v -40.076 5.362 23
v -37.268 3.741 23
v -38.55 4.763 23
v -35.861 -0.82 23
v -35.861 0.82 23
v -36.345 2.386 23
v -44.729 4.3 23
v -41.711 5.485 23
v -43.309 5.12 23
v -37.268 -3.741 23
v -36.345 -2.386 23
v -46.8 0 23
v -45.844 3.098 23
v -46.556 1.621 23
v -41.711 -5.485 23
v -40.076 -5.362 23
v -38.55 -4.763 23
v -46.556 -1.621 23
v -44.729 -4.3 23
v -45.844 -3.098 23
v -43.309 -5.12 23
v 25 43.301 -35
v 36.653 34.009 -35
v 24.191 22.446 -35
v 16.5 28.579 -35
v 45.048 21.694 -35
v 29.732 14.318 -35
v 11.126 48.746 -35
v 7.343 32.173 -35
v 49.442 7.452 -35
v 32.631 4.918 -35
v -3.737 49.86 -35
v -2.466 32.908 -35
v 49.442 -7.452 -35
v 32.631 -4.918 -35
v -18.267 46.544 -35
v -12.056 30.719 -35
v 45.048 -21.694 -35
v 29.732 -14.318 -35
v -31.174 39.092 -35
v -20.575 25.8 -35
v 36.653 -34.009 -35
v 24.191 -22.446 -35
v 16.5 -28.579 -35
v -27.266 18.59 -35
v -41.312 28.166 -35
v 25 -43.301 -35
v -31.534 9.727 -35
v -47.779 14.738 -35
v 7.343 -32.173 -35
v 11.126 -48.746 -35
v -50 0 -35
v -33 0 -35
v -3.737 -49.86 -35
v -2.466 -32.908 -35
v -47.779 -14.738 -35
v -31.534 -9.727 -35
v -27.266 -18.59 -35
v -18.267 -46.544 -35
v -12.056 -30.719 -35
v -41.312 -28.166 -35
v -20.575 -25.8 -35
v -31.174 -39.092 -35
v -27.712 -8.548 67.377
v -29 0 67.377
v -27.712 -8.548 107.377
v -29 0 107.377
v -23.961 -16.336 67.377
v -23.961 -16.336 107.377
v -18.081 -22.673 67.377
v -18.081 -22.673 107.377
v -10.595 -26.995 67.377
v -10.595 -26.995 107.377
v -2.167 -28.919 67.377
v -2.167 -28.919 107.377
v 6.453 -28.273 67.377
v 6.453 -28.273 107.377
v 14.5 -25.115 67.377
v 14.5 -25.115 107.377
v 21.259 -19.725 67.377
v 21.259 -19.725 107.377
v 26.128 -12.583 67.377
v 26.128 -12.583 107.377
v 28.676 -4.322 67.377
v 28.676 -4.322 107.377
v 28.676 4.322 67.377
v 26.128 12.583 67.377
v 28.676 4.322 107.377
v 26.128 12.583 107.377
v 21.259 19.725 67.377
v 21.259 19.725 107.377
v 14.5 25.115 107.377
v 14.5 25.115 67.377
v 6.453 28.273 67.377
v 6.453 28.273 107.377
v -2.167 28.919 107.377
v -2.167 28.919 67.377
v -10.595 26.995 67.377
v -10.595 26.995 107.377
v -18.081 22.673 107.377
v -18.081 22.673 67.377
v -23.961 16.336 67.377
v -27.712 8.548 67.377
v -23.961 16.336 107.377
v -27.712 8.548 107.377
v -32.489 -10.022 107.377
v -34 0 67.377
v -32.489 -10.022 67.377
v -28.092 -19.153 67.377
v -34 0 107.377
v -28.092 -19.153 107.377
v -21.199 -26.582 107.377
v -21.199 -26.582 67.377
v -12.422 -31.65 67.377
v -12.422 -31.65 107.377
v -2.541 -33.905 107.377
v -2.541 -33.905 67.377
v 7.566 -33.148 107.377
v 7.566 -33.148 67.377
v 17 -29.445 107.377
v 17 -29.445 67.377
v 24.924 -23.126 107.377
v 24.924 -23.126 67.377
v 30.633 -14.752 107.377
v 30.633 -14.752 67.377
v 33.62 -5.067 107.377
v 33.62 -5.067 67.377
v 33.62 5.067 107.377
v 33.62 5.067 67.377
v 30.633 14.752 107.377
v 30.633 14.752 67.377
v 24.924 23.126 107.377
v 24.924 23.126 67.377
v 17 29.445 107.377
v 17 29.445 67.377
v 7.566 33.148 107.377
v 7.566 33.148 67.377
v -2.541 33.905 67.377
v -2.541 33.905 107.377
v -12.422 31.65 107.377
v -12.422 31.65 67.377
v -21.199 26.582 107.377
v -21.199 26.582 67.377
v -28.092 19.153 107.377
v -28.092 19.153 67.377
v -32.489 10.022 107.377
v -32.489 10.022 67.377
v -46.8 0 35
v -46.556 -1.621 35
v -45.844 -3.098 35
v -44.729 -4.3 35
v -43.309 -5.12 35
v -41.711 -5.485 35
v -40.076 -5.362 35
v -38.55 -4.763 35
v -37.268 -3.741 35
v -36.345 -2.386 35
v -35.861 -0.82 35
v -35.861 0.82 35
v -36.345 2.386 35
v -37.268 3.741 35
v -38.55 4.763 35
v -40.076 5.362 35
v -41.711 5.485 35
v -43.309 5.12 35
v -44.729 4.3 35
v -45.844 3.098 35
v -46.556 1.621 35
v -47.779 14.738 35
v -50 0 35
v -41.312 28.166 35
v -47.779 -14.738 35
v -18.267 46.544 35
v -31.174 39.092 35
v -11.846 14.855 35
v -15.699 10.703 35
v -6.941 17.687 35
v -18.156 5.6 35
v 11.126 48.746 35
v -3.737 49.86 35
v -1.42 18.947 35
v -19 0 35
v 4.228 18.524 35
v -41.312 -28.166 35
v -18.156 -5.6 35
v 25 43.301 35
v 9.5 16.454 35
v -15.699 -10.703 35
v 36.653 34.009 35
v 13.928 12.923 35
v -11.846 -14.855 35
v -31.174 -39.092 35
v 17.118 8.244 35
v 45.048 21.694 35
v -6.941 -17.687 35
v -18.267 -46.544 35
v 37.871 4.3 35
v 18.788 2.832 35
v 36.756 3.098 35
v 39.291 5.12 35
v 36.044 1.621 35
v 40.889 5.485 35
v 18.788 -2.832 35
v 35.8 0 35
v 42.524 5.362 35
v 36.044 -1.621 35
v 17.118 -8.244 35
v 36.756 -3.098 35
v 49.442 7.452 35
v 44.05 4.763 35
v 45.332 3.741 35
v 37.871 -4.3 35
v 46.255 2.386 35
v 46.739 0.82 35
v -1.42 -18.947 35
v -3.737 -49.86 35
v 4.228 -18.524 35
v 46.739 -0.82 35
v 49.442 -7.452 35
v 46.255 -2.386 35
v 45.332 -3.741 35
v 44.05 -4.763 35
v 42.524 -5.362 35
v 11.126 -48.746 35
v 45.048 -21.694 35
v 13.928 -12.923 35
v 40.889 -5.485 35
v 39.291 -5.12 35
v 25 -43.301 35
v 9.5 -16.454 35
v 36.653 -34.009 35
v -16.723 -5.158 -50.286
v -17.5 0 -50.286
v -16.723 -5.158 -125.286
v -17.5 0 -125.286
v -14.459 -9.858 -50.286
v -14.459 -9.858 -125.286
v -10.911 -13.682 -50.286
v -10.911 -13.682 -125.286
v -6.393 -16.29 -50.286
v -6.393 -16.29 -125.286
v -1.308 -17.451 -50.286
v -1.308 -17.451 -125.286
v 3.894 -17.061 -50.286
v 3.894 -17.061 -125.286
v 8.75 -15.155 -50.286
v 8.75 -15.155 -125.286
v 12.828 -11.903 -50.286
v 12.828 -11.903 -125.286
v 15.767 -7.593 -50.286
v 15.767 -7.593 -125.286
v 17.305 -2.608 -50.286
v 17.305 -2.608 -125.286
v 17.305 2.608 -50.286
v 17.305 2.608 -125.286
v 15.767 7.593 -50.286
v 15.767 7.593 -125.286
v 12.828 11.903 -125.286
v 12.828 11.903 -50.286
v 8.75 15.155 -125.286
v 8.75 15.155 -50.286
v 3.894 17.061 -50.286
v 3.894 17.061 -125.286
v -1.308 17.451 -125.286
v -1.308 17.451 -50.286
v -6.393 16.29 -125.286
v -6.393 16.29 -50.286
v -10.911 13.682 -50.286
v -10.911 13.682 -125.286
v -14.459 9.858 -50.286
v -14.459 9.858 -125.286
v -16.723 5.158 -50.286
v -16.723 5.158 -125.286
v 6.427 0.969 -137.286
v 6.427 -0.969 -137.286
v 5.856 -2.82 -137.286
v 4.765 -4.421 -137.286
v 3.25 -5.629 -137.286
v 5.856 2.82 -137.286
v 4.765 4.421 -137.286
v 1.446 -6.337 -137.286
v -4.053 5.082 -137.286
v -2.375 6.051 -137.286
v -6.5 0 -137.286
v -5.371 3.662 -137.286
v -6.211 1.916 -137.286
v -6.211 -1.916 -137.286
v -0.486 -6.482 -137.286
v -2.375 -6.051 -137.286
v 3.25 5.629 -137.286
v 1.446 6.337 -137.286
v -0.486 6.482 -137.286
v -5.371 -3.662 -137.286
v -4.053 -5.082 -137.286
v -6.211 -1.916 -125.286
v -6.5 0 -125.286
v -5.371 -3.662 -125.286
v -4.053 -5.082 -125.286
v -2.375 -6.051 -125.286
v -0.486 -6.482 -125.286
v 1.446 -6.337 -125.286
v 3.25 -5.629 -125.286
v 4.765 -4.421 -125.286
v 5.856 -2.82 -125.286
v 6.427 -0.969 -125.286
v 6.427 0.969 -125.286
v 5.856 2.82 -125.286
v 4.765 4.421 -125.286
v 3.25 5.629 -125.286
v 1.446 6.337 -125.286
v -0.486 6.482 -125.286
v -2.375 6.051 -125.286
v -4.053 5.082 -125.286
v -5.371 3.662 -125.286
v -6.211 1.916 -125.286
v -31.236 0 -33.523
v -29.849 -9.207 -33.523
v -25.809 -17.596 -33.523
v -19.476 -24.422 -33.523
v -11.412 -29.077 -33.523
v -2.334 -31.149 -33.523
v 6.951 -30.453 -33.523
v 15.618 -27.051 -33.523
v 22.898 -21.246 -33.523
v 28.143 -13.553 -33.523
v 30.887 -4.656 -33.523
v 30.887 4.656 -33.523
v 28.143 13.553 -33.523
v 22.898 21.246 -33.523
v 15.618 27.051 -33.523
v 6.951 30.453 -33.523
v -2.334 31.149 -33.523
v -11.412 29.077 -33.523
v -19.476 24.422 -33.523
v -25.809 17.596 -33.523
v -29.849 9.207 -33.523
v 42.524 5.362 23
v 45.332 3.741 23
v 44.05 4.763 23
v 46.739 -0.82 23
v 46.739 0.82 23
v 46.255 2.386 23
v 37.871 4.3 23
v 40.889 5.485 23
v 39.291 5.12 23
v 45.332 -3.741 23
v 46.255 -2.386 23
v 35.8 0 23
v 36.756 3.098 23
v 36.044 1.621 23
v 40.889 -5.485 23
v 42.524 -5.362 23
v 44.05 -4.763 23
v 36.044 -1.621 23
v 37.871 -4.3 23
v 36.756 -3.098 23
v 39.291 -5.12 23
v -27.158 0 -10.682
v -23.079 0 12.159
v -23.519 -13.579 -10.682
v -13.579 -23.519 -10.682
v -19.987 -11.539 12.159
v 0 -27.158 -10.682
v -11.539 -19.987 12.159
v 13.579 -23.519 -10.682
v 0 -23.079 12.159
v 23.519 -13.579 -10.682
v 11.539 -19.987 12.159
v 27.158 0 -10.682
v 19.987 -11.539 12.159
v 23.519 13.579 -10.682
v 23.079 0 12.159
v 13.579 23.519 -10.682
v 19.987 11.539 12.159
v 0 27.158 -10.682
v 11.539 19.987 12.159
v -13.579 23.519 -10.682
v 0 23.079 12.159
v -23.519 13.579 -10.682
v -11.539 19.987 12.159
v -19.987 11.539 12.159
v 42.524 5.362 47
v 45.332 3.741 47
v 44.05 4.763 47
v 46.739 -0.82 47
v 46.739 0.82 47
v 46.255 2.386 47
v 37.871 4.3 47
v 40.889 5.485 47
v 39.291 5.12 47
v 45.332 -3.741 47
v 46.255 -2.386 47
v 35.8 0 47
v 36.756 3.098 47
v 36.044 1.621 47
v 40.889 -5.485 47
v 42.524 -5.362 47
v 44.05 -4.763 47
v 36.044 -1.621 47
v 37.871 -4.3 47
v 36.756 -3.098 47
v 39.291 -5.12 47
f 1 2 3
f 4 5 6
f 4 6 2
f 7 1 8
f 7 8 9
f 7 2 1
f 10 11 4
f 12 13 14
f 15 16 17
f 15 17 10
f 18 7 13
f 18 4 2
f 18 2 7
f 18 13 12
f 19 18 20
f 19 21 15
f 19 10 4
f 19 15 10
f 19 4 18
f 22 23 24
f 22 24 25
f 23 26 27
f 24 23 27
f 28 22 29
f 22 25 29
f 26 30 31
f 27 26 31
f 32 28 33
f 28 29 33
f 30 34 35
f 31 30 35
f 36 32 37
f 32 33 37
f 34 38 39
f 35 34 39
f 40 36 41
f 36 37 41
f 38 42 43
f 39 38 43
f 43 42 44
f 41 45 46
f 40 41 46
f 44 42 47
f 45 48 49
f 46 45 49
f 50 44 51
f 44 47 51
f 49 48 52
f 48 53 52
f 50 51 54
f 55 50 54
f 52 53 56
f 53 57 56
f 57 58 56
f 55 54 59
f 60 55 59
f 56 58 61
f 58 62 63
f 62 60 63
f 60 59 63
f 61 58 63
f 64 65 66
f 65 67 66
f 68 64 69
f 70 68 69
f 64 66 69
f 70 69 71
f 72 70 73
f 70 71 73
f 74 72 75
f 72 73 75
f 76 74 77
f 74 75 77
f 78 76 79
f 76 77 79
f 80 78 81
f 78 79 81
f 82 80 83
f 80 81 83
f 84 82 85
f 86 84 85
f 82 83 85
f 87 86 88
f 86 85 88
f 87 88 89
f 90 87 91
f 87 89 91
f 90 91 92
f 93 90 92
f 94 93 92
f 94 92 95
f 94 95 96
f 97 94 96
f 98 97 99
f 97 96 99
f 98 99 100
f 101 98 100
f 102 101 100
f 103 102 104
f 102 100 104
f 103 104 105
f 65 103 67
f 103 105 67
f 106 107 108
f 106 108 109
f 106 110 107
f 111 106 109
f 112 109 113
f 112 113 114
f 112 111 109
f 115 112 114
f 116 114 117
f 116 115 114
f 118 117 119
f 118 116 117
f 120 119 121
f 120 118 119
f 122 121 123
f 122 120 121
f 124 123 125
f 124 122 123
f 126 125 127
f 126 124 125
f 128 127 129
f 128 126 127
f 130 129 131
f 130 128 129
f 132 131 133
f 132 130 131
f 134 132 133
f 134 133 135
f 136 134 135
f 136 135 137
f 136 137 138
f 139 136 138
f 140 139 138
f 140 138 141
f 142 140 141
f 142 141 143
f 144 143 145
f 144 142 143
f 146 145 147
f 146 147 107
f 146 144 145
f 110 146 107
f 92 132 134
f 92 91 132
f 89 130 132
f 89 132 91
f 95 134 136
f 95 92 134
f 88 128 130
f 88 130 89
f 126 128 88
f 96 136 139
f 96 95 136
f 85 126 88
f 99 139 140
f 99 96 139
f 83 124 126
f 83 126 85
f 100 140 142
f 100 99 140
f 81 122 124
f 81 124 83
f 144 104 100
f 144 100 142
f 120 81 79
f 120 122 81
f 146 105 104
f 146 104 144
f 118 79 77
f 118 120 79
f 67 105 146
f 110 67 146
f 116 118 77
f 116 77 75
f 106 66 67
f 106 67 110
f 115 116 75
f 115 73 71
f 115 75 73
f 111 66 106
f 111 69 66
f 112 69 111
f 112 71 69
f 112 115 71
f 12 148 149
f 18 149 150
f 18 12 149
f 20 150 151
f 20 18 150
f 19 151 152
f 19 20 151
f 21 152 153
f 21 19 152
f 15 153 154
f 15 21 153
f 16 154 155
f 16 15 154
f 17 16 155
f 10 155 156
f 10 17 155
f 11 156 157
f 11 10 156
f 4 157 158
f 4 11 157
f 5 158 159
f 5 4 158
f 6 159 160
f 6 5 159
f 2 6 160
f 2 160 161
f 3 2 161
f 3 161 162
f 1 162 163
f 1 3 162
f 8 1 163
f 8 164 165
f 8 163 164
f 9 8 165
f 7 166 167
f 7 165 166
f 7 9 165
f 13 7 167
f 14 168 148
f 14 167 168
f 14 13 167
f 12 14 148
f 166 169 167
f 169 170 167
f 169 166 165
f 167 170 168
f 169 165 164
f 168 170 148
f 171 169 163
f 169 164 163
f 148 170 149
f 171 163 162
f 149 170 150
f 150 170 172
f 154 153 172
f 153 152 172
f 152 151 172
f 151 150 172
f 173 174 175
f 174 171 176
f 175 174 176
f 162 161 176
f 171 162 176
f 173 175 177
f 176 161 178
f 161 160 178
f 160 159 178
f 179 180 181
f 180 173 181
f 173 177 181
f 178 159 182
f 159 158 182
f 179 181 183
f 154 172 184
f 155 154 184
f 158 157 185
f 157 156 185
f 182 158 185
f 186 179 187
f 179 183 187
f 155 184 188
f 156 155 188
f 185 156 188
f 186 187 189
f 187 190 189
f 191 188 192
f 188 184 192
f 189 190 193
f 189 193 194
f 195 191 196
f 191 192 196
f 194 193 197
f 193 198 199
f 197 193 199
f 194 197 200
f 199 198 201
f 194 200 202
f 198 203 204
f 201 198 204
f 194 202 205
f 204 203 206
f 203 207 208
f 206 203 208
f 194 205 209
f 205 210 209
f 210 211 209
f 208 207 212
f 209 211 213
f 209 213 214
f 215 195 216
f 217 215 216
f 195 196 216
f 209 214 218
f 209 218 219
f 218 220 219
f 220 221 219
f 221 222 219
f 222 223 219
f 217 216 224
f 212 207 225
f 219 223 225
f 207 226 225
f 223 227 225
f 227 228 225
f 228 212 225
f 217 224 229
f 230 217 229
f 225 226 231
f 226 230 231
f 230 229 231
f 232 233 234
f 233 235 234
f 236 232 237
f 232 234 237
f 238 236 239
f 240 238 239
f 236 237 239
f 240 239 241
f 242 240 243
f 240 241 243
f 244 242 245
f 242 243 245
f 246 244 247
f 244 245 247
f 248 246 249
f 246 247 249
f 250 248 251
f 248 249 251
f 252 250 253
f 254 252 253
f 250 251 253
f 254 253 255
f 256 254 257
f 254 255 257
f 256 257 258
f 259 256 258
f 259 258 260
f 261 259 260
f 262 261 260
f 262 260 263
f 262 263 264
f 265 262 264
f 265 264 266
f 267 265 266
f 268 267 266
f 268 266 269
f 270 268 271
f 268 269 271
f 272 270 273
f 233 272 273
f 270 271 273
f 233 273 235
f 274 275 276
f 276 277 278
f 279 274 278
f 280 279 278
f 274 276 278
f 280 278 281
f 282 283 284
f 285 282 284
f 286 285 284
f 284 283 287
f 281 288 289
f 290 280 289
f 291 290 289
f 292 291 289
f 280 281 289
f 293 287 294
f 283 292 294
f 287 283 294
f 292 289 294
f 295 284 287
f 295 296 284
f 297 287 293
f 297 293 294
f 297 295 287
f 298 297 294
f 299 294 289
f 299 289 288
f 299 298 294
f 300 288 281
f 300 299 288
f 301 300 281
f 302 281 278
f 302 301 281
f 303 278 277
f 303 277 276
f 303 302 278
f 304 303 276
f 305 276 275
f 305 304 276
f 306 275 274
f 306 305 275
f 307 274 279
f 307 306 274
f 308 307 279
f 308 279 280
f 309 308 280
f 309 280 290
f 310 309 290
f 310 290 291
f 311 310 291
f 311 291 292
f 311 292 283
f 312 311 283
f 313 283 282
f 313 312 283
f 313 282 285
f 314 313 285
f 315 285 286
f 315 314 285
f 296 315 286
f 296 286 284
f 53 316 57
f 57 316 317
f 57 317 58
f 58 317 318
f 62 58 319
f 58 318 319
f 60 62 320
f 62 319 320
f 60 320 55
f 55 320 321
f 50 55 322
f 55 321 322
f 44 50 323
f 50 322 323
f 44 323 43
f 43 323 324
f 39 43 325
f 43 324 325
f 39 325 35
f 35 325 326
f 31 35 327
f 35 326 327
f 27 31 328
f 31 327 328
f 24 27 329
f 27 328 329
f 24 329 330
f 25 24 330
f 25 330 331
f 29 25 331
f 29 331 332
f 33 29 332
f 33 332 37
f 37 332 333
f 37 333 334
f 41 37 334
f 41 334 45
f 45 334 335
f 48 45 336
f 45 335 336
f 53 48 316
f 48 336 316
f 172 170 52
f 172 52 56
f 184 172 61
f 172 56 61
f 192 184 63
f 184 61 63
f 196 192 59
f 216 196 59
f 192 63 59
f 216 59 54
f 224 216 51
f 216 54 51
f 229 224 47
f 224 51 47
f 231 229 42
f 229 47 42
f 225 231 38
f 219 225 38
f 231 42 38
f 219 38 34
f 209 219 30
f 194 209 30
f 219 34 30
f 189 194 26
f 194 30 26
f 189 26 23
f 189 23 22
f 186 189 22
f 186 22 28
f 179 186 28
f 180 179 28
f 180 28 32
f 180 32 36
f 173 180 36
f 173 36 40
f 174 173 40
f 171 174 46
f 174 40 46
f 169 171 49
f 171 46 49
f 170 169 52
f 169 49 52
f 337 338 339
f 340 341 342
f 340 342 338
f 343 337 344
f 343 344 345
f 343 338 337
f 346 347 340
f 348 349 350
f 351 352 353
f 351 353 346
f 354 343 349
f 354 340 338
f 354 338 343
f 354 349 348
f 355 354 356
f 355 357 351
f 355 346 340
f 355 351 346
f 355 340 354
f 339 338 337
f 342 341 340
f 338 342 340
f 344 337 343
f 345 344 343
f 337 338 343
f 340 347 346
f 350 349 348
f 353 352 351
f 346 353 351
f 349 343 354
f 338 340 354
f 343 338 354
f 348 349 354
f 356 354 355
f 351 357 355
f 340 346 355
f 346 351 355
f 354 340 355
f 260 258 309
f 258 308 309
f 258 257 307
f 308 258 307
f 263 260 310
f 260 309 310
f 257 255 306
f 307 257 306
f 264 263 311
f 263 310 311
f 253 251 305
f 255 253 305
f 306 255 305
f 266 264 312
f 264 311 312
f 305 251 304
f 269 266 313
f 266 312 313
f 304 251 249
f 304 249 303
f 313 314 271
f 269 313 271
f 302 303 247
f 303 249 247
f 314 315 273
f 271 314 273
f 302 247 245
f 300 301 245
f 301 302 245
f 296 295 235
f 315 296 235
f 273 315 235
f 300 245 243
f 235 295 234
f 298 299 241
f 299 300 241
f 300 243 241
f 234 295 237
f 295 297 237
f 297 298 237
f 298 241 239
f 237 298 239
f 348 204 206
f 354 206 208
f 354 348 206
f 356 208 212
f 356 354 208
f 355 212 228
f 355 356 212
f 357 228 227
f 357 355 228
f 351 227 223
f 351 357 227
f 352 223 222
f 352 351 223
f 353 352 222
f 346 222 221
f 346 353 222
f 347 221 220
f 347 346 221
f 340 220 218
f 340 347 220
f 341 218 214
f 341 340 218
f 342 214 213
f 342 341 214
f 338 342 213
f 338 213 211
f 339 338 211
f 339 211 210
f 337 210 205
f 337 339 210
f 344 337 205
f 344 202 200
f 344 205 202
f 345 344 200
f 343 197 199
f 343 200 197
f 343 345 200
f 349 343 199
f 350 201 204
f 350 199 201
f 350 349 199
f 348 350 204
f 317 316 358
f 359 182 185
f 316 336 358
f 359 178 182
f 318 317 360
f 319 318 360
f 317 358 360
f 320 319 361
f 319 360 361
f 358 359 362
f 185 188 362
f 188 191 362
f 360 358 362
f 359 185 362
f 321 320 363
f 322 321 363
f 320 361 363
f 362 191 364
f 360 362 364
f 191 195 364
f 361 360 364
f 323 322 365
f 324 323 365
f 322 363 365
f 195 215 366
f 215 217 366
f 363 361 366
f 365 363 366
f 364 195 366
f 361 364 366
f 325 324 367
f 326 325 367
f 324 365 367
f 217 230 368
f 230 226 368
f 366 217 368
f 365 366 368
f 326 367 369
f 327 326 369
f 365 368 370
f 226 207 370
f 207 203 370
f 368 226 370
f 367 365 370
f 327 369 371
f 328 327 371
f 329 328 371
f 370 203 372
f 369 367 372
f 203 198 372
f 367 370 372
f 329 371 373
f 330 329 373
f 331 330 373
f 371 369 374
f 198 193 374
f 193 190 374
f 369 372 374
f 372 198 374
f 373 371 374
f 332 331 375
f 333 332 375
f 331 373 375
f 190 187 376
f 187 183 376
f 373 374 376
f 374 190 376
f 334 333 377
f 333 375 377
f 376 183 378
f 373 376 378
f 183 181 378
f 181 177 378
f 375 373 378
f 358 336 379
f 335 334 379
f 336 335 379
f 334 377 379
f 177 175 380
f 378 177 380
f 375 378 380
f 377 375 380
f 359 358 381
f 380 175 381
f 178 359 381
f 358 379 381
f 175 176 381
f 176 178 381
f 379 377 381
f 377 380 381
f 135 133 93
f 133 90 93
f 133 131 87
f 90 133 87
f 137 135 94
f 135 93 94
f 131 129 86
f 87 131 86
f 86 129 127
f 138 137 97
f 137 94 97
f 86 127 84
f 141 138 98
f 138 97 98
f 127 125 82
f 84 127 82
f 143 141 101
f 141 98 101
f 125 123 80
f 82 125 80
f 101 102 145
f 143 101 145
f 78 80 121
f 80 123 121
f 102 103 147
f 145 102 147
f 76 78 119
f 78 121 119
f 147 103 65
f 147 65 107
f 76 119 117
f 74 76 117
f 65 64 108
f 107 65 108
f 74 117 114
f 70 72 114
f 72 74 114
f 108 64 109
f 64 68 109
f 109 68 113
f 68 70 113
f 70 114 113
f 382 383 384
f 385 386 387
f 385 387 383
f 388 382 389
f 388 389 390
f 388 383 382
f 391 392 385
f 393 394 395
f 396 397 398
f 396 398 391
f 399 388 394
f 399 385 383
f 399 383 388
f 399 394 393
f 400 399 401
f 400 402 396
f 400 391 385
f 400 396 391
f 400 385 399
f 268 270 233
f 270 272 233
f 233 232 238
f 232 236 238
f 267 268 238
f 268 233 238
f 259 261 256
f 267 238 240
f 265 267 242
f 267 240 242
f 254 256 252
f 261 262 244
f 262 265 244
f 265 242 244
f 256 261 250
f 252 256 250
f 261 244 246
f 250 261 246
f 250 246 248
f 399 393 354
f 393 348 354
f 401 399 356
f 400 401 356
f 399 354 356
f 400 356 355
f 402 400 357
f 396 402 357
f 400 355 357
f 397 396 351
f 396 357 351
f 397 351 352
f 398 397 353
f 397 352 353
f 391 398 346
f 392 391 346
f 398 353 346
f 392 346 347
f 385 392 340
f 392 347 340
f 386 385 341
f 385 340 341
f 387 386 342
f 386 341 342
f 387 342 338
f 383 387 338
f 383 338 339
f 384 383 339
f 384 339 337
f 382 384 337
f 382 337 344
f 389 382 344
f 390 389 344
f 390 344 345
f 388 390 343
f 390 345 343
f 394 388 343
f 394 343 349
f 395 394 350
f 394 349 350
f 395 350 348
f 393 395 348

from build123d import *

# Parameters (mm, degrees)
F0_W    = 5
F0_H    = 40
F0_W_2  = 5.5
F0_H_2  = 12
F0_W_3  = 6.5
F4_SIZE = 1.5


with BuildPart() as f1:
    # F0 (on Front) → F1 (revolve)
    with BuildSketch(Plane.XZ):
        with Locations((-31.5, 87.3772501945)):
            Rectangle(F0_W, F0_H)
    revolve(axis=Axis((0, 0, -11.2999752164), (0, 0, 1)))


with BuildPart() as f2:
    # F0 (on Front) → F2 (revolve)
    with BuildSketch(Plane.XZ):
        Polygon((-50, -35), (-31.5, -35), (-19, 35), (-35.8, 35), (-35.8, 23), (-41.3, 23), (-46.8, 23), (-46.8, 35), (-50, 35), align=None)
        with Locations((-38.55, 29)):
            Rectangle(F0_W_2, F0_H_2)
        with Locations((-44.05, 29)):
            Rectangle(F0_W_2, F0_H_2)
    revolve(axis=Axis((0, 0, -11.2999752164), (0, 0, 1)))

    # F4
    f4_edges = [f2.edges().sort_by_distance(p)[0] for p in [
        (31.5, 0, -35),
    ]]
    chamfer(f4_edges, length=F4_SIZE)

    # F0 (on Front) → F5 (revolve, cut)
    with BuildSketch(Plane.XZ):
        with Locations((-44.05, 29)):
            Rectangle(F0_W_2, F0_H_2)
        with Locations((-44.05, 41)):
            Rectangle(F0_W_2, F0_H_2)
    revolve(axis=Axis((-41.3, 0, 39.9964758903), (0, 0, 1)), mode=Mode.SUBTRACT)

    # F0 (on Front) → F6 (revolve, cut)
    with BuildSketch(Plane.XZ):
        with Locations((38.55, 41)):
            Rectangle(F0_W_2, F0_H_2)
        with Locations((38.55, 29)):
            Rectangle(F0_W_2, F0_H_2)
    revolve(axis=Axis((41.3, 0, 37.3383955806), (0, 0, 1)), mode=Mode.SUBTRACT)


with BuildPart() as f3:
    # F0 (on Front) → F3 (revolve)
    with BuildSketch(Plane.XZ):
        Polygon((0, -125.286164403), (0, -50.286164403), (-17.5, -50.286164403), (-17.5, -125.286164403), (-6.5, -125.286164403), align=None)
        with Locations((-3.25, -131.286164403)):
            Rectangle(F0_W_3, F0_H_2)
    revolve(axis=Axis((0, 0, -11.2999752164), (0, 0, 1)))


with BuildPart() as f7:
    # F0 (on Front) → F7 (revolve)
    with BuildSketch(Plane.XZ):
        with Locations((38.55, 41)):
            Rectangle(F0_W_2, F0_H_2)
        with Locations((38.55, 29)):
            Rectangle(F0_W_2, F0_H_2)
    revolve(axis=Axis((41.3, 0, 37.3383955806), (0, 0, 1)))


solid = Compound([f1.part, f2.part, f3.part, f7.part])
